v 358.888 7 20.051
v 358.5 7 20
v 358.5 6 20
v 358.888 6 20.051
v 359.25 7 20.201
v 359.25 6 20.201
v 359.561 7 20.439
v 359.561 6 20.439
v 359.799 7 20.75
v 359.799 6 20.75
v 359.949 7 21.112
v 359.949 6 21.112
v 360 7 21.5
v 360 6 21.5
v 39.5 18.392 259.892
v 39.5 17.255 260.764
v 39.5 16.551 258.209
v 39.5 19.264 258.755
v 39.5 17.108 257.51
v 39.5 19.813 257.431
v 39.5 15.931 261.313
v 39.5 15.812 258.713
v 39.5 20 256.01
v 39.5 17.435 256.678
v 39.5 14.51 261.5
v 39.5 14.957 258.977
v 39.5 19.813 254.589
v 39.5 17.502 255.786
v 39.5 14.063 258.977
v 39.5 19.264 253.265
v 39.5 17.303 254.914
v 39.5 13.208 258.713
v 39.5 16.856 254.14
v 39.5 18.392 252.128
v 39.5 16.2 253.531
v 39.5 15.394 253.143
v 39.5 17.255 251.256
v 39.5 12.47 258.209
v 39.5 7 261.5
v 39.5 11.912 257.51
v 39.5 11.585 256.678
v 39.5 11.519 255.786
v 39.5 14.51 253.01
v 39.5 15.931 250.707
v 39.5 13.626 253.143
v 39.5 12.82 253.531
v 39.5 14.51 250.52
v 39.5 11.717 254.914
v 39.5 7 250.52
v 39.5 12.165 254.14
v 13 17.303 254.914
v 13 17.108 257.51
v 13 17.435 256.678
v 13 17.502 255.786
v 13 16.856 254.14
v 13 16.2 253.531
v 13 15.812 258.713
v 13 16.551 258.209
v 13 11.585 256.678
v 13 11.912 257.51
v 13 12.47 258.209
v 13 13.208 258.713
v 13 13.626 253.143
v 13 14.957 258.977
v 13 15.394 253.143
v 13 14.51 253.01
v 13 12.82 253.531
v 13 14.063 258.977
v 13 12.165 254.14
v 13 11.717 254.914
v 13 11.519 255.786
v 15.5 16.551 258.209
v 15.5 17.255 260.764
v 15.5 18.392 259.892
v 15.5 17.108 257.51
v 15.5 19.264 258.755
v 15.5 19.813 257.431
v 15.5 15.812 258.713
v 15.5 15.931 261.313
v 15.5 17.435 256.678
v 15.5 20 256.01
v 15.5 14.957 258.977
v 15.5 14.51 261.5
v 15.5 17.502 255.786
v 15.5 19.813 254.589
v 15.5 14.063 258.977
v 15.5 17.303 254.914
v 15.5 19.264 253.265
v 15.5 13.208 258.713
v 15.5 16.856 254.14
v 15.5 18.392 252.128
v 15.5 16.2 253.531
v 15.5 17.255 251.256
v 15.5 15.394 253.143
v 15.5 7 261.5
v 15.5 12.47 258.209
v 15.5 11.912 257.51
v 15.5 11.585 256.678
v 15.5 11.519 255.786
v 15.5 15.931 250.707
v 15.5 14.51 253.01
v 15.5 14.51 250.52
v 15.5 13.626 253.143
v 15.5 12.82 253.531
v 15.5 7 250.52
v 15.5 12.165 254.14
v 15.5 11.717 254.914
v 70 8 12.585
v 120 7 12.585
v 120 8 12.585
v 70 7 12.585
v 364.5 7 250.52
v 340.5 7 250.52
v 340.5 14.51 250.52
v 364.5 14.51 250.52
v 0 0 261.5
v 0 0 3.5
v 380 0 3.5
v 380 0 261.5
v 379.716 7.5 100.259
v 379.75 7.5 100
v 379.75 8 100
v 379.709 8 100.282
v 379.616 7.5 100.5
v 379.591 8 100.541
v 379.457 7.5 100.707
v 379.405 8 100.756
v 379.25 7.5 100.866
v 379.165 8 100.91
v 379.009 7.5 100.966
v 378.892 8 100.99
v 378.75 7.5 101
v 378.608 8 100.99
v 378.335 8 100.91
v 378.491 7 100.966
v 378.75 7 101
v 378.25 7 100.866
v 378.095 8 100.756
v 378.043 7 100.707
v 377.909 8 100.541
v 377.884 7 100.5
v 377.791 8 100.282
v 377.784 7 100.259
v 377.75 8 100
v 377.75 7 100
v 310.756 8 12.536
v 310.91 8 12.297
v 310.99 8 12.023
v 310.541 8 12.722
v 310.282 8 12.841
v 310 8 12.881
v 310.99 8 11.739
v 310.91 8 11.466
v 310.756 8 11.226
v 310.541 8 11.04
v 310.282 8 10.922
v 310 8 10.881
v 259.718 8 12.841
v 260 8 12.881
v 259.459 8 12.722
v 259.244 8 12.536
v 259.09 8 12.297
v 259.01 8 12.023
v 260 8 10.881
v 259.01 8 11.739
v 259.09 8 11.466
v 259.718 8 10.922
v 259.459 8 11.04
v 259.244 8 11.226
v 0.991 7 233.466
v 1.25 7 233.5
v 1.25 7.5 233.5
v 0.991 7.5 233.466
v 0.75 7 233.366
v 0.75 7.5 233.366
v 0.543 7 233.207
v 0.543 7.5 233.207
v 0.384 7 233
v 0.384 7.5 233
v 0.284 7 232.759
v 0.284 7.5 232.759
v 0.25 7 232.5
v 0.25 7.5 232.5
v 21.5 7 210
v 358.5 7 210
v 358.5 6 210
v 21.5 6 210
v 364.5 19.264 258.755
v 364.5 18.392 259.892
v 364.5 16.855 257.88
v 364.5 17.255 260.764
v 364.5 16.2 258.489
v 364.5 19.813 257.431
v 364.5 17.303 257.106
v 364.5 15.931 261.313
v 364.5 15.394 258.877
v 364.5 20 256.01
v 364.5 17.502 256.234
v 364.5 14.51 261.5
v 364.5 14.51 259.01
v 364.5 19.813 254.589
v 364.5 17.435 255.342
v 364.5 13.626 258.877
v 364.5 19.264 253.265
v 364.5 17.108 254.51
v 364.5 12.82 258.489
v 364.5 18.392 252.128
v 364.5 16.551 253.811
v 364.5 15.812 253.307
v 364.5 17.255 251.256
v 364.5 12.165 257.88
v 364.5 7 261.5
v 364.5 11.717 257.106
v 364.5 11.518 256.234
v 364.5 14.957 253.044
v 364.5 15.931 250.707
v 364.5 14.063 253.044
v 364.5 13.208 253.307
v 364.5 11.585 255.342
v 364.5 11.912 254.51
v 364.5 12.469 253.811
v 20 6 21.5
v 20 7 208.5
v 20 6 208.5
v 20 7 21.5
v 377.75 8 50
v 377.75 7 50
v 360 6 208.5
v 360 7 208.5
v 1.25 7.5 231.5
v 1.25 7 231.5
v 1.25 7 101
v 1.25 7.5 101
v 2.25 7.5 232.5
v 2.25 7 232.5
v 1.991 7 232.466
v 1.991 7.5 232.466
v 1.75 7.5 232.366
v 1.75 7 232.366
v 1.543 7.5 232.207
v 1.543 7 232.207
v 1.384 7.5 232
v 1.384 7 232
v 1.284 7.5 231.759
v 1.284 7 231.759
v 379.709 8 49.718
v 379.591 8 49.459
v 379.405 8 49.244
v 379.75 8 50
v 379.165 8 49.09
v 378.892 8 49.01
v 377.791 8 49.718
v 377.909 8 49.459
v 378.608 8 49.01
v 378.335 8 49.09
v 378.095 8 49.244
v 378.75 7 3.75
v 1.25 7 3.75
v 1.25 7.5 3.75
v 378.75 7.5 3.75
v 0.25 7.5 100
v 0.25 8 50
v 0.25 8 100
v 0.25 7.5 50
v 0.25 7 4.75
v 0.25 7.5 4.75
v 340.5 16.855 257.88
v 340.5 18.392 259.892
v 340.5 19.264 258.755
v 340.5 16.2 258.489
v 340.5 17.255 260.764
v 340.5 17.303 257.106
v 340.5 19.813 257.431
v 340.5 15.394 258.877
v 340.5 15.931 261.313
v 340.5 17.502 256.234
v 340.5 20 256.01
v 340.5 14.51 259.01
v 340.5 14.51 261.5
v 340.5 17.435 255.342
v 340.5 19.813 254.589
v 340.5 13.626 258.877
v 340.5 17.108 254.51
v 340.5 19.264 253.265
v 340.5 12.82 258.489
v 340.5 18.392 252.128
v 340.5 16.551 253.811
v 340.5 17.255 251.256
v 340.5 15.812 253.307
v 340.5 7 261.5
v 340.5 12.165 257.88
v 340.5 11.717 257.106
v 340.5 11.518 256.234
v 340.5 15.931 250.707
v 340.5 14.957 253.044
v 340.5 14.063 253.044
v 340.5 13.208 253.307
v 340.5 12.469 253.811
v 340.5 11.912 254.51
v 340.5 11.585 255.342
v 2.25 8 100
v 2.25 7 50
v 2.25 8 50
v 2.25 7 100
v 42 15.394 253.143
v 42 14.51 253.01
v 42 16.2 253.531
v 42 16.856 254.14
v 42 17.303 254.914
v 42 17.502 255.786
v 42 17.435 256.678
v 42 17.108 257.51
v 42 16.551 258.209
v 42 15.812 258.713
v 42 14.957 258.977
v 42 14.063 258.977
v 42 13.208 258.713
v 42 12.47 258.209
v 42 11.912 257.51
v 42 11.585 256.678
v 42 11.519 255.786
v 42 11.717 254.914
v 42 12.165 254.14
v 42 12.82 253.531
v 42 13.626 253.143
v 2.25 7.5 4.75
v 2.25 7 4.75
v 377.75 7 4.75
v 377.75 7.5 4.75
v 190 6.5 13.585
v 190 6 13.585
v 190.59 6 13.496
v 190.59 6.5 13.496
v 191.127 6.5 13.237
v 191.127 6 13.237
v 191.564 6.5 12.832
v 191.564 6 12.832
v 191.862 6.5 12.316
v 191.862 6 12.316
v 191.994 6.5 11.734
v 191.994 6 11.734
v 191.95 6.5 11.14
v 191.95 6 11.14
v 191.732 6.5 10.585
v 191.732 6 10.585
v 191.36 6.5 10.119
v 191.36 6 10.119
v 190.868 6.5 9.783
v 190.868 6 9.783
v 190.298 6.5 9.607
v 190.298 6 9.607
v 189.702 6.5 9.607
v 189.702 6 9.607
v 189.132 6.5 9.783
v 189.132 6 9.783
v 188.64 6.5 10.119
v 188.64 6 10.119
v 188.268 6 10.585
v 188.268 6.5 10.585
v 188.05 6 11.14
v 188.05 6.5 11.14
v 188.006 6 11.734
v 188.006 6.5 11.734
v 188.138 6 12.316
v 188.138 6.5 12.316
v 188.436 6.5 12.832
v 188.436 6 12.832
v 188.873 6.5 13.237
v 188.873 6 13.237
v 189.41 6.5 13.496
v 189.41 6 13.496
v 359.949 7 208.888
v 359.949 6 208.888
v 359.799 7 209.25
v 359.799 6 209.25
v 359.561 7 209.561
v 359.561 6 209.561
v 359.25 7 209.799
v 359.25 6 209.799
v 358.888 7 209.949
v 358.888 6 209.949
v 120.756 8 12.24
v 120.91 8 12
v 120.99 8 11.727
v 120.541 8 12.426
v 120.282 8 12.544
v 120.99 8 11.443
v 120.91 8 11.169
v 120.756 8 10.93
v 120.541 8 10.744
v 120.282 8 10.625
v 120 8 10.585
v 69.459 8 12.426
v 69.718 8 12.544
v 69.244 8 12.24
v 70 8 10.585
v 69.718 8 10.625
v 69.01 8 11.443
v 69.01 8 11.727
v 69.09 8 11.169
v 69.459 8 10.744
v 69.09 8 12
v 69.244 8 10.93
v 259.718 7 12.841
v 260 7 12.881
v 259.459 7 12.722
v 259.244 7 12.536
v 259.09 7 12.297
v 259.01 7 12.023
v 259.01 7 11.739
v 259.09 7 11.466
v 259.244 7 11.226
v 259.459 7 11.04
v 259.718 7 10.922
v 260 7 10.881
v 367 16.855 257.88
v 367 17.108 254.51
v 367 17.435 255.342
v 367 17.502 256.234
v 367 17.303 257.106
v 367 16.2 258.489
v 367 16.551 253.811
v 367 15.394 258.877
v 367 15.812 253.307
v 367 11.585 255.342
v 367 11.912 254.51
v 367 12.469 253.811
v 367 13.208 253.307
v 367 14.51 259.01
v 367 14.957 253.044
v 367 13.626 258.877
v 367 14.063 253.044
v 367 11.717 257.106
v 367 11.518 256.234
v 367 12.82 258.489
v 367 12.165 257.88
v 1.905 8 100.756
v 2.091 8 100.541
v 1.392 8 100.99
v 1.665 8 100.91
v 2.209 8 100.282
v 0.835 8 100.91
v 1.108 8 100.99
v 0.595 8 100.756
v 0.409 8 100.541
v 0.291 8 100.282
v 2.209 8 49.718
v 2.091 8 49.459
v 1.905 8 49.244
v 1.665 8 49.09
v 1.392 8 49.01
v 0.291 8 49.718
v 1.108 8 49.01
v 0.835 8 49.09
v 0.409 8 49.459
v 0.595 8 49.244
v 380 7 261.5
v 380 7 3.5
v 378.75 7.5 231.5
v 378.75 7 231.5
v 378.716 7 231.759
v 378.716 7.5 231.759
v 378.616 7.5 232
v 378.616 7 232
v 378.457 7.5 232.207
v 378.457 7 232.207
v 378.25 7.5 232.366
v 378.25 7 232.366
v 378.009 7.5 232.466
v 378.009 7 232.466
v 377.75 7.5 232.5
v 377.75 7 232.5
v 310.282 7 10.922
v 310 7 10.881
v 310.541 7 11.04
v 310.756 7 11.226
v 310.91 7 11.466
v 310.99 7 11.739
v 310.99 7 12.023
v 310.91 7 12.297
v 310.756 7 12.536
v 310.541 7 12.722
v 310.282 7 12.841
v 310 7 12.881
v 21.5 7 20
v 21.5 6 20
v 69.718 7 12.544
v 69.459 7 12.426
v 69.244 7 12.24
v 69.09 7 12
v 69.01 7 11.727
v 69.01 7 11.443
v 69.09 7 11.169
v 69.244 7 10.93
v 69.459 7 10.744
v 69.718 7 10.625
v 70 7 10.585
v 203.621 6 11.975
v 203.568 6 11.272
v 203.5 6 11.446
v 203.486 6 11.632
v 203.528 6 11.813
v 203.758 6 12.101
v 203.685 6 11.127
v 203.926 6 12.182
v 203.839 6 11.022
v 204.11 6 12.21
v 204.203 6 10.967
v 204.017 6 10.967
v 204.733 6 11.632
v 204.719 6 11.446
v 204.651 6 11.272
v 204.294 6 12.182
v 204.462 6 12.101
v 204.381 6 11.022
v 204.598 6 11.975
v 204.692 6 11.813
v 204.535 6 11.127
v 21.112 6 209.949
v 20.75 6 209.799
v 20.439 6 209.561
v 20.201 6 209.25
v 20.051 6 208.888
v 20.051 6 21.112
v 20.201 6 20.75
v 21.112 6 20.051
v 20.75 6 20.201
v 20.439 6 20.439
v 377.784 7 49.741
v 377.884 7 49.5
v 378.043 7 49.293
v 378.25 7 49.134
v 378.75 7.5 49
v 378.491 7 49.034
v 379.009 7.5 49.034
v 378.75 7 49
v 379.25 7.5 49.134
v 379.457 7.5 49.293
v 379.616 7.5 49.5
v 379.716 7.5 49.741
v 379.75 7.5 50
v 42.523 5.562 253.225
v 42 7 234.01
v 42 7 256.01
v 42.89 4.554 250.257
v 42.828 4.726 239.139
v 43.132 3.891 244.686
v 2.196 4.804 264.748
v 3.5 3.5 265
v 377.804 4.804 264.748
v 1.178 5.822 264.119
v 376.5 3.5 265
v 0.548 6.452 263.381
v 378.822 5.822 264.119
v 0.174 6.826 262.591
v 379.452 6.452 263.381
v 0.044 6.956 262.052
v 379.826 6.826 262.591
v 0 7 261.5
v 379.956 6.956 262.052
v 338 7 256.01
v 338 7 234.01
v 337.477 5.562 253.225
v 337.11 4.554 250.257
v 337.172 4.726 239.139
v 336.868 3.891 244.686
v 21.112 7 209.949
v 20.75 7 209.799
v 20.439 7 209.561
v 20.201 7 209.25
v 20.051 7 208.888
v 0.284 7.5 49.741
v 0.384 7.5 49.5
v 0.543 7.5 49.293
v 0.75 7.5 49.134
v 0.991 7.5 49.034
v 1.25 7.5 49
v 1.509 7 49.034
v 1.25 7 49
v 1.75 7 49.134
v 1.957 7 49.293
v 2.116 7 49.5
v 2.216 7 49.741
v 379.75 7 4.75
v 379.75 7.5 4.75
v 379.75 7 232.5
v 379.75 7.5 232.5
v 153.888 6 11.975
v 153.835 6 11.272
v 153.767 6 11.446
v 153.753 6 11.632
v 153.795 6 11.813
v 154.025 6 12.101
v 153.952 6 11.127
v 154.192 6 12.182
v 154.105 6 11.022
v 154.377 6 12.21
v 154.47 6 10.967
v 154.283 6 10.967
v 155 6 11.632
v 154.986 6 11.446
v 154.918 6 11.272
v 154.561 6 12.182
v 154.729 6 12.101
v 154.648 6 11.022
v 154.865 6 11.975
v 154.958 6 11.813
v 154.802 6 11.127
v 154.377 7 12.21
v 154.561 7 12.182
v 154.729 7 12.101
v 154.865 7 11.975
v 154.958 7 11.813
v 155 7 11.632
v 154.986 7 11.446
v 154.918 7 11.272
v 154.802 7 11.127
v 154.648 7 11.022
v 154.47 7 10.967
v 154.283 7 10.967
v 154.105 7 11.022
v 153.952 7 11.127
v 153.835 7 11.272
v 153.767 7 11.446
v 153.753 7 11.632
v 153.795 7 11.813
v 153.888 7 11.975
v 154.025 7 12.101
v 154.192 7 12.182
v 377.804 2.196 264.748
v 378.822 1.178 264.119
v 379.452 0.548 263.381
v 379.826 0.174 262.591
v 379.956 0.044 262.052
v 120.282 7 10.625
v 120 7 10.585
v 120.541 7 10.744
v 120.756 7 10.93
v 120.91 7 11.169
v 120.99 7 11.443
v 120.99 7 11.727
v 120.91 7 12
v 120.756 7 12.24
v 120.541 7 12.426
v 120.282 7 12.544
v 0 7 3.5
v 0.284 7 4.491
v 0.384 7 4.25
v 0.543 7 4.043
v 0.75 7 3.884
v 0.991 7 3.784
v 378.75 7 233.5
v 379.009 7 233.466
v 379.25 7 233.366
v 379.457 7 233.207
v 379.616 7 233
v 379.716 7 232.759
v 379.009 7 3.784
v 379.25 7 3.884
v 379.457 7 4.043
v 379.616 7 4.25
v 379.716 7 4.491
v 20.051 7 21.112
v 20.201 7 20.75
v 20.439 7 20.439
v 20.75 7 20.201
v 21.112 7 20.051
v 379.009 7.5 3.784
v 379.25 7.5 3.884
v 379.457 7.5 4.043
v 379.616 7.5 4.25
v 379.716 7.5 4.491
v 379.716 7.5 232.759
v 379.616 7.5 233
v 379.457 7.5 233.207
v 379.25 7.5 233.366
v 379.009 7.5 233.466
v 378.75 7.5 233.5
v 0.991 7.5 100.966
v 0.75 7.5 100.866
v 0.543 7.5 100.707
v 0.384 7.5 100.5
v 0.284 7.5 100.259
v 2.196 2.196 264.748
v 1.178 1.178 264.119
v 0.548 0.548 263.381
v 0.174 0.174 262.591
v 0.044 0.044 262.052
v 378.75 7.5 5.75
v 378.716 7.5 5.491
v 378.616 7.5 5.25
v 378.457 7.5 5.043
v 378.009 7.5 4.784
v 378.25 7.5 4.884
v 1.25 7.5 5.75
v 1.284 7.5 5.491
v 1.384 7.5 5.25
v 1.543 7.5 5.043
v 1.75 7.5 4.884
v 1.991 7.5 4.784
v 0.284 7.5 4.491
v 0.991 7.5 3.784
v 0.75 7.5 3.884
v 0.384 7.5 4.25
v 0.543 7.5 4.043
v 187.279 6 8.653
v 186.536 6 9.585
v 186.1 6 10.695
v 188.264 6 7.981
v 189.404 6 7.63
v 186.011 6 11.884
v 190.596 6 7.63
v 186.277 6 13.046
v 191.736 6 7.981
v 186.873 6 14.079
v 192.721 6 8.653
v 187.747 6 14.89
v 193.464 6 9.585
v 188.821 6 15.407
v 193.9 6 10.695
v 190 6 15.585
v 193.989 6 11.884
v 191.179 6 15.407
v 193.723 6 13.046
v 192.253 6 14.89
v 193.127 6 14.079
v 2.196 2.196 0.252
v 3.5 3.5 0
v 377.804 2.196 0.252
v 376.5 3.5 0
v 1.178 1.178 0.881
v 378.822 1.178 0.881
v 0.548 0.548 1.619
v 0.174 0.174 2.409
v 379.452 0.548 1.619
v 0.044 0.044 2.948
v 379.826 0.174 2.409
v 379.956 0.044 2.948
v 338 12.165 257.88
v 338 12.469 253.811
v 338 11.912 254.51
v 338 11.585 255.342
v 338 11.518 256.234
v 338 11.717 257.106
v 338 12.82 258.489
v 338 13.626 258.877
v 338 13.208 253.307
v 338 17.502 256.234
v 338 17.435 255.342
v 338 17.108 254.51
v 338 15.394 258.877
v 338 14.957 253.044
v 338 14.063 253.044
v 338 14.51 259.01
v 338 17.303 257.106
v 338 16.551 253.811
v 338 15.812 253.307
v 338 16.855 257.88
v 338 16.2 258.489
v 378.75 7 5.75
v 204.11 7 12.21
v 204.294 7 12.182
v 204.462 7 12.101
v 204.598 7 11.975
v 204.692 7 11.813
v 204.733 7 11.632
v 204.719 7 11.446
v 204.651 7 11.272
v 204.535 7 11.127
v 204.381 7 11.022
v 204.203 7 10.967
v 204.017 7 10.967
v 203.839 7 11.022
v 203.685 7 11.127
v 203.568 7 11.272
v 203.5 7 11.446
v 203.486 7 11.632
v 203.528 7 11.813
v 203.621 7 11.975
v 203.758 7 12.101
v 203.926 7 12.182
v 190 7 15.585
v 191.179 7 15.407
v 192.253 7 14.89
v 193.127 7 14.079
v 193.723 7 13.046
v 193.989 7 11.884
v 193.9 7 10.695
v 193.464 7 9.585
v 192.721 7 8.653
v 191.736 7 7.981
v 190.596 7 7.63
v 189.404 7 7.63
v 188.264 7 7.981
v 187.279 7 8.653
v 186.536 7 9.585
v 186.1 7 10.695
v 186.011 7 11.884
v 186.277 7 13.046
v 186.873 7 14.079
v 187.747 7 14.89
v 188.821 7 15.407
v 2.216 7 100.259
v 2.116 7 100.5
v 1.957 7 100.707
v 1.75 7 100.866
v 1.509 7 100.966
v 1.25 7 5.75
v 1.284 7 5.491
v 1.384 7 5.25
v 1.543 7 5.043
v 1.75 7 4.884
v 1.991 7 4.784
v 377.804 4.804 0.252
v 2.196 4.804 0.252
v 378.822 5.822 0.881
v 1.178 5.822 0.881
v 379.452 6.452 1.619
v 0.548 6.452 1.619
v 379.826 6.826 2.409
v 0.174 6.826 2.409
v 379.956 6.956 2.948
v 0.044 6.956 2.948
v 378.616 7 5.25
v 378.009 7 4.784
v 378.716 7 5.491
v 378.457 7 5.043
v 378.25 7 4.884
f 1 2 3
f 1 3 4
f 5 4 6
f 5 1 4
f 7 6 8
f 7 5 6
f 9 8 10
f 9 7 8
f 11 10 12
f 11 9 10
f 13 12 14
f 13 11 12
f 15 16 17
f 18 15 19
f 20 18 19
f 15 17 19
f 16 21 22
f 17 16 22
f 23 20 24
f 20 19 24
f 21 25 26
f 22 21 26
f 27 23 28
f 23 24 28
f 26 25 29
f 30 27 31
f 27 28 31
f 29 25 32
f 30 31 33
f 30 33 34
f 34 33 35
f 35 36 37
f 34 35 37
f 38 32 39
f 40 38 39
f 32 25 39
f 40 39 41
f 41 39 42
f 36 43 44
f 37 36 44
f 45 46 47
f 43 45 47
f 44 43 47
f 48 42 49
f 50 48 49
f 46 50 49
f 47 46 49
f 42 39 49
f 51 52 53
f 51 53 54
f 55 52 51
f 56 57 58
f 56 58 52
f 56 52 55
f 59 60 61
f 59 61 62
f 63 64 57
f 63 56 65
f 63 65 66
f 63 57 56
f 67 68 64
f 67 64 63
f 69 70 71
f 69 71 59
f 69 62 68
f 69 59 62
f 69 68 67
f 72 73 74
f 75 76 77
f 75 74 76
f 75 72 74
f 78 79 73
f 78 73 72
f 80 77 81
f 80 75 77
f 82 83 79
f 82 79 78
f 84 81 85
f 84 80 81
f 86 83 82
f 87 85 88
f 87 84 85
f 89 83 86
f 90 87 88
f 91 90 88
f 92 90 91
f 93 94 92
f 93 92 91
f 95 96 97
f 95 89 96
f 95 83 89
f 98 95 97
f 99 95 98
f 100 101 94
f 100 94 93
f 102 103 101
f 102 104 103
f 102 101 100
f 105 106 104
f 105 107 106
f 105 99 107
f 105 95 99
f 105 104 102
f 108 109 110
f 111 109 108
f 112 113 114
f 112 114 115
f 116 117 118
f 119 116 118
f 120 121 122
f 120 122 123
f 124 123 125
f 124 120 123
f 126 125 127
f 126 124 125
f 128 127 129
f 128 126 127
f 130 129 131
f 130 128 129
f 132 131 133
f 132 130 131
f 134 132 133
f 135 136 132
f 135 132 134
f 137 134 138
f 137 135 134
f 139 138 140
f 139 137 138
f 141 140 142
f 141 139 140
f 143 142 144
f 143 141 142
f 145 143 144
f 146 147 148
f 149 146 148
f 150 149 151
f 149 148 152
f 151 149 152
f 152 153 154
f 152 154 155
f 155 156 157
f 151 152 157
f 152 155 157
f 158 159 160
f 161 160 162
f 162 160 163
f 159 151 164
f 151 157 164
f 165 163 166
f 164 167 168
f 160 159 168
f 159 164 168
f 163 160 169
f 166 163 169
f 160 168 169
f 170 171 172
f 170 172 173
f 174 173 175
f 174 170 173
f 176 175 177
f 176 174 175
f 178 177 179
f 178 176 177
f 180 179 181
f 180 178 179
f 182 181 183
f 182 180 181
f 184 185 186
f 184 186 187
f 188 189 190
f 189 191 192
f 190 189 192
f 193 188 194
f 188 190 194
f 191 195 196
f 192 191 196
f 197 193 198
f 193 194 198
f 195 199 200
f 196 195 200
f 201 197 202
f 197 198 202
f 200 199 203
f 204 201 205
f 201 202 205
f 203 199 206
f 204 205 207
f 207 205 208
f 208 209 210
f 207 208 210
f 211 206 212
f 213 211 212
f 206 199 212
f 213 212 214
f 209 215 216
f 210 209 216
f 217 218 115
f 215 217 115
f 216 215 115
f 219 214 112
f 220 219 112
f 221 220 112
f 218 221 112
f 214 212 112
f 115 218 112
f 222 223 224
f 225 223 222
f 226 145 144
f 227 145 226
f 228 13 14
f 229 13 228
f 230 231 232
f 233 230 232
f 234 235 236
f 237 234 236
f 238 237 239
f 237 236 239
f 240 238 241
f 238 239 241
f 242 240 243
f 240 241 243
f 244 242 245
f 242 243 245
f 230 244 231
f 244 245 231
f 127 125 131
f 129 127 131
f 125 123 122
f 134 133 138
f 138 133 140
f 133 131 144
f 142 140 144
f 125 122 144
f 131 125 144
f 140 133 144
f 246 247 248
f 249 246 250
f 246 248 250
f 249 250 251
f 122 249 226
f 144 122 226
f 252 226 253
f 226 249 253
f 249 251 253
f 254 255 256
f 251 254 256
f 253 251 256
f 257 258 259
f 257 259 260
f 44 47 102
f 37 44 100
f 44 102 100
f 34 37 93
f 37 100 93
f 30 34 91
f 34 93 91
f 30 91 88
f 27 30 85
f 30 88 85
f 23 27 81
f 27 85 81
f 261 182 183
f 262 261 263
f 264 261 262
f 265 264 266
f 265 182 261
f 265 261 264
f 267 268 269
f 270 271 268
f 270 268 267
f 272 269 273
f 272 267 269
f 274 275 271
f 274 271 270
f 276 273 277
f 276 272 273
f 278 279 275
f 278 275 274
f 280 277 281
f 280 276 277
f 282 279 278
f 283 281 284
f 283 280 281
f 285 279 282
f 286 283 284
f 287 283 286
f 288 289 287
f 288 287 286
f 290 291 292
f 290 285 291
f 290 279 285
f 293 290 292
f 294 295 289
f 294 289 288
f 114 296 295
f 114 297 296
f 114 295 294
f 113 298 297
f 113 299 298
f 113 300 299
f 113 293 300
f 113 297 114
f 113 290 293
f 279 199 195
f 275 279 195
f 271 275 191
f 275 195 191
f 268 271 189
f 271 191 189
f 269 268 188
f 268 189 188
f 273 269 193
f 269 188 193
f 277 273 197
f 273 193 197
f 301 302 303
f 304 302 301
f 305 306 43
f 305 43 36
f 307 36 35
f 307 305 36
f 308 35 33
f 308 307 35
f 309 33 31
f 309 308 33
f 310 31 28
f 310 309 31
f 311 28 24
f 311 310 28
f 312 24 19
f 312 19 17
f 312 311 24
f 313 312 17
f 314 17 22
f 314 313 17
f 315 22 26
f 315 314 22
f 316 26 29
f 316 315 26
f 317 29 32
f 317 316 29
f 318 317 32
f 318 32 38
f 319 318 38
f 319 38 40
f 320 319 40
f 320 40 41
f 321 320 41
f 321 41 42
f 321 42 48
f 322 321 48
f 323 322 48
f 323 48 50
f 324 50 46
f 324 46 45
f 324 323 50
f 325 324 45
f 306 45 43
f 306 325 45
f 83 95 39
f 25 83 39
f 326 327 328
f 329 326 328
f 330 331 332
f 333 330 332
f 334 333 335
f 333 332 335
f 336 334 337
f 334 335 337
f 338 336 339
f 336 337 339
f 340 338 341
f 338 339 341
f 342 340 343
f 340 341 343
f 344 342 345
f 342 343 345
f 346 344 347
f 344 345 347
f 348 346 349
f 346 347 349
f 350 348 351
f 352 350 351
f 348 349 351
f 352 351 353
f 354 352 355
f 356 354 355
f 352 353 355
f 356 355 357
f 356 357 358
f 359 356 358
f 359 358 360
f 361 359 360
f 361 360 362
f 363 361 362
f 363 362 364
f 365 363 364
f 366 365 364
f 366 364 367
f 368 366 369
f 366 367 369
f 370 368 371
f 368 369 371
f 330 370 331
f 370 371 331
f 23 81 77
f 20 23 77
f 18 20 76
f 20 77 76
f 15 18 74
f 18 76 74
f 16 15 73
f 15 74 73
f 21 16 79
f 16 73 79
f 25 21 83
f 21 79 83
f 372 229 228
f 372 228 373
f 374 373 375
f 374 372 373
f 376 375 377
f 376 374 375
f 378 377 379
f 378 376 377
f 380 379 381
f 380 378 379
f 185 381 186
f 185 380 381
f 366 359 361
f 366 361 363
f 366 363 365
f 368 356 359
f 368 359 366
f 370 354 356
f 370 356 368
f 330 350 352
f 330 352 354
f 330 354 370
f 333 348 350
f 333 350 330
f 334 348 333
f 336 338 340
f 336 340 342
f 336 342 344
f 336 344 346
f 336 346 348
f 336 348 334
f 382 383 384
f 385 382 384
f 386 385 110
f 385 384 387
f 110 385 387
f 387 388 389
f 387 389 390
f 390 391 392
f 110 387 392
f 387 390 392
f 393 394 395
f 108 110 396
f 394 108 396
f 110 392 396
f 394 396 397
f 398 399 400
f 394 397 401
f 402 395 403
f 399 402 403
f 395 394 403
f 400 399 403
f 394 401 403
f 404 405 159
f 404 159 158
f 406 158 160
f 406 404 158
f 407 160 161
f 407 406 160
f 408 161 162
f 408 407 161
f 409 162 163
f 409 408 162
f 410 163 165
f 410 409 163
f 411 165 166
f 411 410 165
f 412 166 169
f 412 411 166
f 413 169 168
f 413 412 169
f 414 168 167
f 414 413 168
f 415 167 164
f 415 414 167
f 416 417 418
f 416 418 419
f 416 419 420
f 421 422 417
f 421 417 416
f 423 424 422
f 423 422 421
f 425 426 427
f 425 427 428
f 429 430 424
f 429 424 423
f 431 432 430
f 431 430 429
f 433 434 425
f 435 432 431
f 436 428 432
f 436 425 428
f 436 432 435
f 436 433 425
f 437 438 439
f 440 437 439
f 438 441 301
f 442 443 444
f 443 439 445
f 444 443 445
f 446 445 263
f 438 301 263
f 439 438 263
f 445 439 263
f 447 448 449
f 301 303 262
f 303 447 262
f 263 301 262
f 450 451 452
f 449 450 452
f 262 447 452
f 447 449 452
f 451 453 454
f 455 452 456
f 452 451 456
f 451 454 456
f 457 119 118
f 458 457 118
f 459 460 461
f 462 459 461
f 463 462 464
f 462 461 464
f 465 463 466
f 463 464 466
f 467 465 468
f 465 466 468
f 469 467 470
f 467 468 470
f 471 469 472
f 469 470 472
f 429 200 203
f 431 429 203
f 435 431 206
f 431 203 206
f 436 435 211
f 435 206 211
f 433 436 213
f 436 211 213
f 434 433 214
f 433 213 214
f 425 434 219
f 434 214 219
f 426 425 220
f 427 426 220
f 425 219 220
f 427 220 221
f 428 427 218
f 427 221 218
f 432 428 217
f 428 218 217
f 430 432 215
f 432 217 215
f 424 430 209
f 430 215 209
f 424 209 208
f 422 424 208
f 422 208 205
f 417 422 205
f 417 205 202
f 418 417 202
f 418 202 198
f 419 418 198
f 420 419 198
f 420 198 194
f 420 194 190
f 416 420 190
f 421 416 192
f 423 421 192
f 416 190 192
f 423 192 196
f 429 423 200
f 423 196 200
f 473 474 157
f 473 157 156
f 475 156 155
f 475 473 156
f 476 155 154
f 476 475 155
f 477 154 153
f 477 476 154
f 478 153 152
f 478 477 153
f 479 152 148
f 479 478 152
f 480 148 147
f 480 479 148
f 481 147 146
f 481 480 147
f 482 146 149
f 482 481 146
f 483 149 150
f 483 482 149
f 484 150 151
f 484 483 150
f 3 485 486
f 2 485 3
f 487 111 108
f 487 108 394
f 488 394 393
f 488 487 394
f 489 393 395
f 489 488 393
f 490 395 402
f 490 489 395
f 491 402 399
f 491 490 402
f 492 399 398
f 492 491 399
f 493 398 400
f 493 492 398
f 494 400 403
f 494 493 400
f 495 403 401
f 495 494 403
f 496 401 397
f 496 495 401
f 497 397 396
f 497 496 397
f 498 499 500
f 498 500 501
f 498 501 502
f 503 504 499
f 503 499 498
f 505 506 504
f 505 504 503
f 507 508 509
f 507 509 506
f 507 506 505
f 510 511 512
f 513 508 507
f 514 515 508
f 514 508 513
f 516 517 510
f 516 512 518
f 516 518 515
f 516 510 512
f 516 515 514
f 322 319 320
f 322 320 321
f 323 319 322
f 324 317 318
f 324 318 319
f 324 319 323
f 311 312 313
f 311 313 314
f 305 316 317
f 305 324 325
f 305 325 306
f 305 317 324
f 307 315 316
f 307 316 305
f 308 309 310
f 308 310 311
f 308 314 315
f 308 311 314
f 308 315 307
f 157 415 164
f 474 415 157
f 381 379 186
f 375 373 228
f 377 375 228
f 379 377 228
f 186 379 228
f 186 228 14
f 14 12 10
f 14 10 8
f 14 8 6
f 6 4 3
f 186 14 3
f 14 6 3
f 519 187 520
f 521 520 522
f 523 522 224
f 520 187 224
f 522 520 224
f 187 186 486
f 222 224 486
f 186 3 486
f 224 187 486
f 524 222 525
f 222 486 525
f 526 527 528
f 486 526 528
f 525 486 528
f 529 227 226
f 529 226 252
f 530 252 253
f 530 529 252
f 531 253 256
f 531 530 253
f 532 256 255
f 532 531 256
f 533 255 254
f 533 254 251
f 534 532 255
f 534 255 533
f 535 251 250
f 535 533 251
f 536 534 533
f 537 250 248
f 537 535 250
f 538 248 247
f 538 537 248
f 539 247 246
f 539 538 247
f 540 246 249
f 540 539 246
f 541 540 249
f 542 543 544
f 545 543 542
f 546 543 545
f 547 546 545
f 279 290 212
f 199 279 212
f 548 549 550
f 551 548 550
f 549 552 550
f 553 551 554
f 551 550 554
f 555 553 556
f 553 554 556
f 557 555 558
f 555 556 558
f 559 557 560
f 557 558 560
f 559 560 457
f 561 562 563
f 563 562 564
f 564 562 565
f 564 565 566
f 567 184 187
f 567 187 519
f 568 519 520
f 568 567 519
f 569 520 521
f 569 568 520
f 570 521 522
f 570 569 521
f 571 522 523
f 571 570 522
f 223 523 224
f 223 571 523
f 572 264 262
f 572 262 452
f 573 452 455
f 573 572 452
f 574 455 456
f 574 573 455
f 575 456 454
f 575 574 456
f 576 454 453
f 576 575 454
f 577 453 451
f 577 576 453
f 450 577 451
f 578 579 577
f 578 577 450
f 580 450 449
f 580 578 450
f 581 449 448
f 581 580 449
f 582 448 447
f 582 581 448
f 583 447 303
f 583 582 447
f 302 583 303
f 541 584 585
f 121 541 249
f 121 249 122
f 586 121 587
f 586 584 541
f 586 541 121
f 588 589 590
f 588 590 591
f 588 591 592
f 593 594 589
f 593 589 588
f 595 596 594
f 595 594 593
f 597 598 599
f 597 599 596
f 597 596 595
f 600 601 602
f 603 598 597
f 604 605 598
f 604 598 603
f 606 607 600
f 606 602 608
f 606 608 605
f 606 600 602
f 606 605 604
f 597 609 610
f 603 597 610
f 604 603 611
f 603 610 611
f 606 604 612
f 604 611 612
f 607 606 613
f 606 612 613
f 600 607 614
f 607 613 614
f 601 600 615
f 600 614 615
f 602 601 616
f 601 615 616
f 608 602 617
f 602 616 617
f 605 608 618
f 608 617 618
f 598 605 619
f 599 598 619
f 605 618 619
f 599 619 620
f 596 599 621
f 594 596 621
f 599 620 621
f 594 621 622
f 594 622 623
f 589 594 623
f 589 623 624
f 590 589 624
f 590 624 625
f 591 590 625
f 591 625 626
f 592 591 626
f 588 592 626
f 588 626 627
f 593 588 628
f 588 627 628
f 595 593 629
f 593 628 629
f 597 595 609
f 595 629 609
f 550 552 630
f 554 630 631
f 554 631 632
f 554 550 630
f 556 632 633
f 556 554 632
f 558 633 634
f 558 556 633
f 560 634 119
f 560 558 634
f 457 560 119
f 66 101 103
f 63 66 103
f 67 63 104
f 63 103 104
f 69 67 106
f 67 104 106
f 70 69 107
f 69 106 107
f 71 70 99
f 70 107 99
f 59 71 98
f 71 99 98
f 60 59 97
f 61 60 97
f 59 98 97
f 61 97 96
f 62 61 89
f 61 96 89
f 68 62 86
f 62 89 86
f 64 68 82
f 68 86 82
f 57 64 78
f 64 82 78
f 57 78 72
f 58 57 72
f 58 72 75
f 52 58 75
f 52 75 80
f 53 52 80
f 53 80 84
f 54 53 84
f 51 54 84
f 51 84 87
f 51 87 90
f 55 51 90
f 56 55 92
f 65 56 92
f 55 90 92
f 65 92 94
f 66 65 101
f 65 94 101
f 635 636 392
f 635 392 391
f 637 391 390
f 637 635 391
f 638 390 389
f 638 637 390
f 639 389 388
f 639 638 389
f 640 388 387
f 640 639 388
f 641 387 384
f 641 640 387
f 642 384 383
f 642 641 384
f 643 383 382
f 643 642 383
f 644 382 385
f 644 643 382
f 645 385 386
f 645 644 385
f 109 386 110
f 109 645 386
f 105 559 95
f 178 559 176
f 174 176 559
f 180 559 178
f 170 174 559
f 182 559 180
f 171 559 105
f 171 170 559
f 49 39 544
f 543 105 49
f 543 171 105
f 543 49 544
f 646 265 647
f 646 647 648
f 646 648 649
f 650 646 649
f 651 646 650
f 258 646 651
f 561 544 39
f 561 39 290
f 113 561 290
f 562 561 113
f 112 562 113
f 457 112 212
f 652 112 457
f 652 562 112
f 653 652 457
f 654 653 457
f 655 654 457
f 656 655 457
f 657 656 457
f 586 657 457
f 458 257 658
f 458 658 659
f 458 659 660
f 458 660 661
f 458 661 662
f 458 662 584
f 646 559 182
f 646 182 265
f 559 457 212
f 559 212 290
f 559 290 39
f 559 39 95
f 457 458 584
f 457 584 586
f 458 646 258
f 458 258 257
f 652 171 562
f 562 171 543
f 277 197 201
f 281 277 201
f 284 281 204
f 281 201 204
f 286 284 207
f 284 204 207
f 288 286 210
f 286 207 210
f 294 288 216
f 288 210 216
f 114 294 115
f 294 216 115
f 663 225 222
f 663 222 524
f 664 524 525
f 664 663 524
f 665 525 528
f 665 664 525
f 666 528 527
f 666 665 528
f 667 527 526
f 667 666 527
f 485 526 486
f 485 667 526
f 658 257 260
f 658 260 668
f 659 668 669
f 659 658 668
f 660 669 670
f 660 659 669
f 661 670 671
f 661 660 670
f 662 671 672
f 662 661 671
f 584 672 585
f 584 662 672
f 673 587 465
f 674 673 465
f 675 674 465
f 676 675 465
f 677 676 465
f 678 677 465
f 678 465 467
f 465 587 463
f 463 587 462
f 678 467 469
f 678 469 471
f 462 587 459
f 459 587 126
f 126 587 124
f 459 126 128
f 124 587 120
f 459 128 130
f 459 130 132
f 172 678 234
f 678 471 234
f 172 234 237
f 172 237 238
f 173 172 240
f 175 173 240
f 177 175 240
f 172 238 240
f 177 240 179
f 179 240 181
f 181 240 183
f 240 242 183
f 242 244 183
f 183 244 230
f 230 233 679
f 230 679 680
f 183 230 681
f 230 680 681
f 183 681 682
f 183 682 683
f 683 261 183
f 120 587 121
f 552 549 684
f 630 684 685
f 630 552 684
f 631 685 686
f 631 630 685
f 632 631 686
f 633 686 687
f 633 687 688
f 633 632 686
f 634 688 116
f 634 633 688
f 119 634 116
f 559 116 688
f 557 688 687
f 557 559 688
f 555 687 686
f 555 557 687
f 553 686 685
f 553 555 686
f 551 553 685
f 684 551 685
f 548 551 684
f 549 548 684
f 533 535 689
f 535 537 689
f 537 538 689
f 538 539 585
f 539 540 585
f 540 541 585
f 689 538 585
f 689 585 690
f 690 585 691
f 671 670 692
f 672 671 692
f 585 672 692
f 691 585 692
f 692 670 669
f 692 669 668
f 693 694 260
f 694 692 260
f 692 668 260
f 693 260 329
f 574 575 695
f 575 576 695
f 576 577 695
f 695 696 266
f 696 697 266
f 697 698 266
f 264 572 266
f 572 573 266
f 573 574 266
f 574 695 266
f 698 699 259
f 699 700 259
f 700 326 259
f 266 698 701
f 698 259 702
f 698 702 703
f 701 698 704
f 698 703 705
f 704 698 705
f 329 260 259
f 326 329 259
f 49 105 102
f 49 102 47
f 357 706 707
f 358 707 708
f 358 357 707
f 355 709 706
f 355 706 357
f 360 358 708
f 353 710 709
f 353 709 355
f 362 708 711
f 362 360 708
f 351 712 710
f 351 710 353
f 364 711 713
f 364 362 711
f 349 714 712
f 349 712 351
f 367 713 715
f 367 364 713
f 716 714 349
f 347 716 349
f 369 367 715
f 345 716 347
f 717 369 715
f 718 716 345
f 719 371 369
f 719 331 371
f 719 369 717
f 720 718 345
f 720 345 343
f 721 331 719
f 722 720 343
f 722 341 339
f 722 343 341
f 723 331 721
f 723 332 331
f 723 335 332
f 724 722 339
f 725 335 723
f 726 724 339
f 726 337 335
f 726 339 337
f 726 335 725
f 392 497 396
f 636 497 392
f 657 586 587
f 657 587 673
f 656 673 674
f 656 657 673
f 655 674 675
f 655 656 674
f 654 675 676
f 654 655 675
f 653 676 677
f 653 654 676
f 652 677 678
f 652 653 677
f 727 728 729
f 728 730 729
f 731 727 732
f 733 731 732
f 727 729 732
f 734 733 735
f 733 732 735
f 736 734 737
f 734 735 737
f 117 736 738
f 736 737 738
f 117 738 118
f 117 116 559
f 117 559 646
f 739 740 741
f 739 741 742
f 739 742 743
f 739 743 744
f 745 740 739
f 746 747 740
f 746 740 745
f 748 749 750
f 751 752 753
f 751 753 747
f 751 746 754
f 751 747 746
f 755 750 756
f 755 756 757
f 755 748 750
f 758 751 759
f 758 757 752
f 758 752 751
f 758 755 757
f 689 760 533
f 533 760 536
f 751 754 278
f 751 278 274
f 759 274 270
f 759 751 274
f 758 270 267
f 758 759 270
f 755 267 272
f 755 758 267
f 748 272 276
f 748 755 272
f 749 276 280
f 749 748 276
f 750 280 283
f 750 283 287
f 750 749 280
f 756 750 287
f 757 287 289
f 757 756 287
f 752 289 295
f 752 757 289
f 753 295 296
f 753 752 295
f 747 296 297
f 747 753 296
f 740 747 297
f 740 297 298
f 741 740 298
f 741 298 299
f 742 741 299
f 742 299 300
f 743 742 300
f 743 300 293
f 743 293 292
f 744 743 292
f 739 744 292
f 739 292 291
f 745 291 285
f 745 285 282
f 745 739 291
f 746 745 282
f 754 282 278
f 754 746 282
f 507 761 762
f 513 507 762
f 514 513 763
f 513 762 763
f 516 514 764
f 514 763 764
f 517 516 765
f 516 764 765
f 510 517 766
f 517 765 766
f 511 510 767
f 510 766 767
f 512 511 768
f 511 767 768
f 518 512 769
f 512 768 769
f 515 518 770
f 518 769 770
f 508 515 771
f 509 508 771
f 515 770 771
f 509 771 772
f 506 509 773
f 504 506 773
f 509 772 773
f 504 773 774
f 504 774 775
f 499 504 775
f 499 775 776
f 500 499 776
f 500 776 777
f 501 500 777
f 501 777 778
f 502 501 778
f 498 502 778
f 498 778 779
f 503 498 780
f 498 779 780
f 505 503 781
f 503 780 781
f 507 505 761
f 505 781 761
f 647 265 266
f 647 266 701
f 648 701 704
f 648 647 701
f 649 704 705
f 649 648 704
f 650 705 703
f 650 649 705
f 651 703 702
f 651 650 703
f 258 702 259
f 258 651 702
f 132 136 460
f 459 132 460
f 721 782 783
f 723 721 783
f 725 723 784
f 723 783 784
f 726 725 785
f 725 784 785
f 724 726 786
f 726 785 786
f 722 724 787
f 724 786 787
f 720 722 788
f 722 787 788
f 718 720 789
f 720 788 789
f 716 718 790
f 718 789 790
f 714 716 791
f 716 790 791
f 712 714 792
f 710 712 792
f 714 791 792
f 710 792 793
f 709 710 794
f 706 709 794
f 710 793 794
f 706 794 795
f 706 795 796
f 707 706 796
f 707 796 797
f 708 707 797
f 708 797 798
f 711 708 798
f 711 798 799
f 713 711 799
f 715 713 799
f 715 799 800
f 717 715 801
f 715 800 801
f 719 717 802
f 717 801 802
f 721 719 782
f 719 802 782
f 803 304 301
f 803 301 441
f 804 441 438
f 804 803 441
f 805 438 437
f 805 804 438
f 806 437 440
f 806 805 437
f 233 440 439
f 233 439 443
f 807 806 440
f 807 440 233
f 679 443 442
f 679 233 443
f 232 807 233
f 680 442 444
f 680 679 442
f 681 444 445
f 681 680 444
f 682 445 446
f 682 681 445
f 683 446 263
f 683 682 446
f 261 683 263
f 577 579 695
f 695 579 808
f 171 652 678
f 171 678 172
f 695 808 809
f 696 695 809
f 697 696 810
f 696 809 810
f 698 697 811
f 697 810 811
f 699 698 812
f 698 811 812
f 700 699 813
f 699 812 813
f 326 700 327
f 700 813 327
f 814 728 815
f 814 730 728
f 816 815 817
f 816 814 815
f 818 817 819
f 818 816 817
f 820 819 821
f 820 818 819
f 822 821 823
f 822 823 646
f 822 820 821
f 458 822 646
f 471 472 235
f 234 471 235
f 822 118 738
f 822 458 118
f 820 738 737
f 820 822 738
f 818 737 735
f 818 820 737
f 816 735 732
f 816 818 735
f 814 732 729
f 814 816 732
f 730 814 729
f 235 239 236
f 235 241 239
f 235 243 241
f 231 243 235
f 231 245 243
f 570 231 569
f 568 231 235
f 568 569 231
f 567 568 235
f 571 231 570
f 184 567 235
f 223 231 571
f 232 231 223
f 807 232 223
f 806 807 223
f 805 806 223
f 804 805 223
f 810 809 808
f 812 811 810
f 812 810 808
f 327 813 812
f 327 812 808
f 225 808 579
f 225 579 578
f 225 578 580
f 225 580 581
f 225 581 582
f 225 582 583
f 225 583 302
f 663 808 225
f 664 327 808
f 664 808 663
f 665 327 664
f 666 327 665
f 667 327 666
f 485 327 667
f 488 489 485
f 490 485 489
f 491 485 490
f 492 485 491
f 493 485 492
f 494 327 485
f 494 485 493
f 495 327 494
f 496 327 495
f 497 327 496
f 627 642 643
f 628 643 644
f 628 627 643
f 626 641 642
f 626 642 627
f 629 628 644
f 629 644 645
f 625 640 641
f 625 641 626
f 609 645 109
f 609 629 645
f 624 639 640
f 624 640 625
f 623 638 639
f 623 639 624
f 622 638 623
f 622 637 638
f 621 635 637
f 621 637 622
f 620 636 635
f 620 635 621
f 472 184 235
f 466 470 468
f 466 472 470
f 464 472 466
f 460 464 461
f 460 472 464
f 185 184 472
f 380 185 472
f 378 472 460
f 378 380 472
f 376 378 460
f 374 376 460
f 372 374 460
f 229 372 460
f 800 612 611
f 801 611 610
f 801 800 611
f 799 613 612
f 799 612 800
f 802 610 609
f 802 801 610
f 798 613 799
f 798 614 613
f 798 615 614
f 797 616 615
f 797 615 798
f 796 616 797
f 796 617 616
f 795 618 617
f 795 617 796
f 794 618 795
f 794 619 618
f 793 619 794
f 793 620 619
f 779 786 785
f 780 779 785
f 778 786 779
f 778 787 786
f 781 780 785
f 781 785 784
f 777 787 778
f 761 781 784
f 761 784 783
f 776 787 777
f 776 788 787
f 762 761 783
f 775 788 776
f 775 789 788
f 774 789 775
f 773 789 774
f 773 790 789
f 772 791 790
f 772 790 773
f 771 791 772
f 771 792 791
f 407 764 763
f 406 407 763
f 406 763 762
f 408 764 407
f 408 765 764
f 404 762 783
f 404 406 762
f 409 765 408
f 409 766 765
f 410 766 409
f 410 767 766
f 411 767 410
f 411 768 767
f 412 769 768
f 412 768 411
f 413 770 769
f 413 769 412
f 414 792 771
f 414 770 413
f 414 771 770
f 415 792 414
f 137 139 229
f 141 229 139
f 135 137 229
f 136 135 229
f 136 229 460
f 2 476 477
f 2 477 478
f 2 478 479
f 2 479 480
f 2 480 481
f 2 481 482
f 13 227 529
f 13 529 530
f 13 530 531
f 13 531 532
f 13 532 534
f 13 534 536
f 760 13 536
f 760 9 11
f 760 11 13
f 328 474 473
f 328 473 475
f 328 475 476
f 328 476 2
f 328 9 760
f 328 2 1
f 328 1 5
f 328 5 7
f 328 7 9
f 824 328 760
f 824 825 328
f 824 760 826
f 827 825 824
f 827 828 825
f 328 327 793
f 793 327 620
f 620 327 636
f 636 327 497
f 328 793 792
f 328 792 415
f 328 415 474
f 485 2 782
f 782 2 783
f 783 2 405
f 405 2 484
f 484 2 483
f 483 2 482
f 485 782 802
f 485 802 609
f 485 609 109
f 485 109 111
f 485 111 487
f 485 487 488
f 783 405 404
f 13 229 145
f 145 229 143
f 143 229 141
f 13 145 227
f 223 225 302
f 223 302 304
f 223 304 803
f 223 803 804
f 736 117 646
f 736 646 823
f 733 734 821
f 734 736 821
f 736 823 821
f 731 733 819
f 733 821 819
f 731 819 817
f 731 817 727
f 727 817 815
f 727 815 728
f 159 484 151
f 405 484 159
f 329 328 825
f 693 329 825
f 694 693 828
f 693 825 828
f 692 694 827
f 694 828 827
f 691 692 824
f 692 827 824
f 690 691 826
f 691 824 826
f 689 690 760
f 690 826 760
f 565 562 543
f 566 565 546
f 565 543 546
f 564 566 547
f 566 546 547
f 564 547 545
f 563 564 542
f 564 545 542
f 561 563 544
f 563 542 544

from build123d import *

# Parameters (mm, degrees)
SKETCH1_W            = 380
SKETCH1_H            = 265
BOSS_EXTRUDE1_DEPTH  = 7
FILLET2_R            = 3.5
BOSS_EXTRUDE2_DEPTH  = 0.5
CUT_EXTRUDE1_DEPTH   = 1
SKETCH4_R            = 4
CUT_EXTRUDE2_DEPTH   = 1
SKETCH5_R            = 0.625
CUT_EXTRUDE3_DEPTH   = 1
SKETCH6_R            = 0.625
CUT_EXTRUDE4_DEPTH   = 1
SKETCH7_W            = 24
SKETCH7_H            = 10.979763194
BOSS_EXTRUDE3_DEPTH  = 13
CUT_EXTRUDE6_DEPTH   = 27
SKETCH9_R            = 3
BOSS_EXTRUDE4_DEPTH  = 2.5
BOSS_EXTRUDE5_START  = 2.5
SKETCH10_R           = 3
BOSS_EXTRUDE5_DEPTH  = 2.5
SKETCH11_W           = 24
SKETCH11_H           = 10.98
BOSS_EXTRUDE6_DEPTH  = 13
CUT_EXTRUDE9_DEPTH   = 296
SKETCH22_R           = 3
BOSS_EXTRUDE7_DEPTH  = 2.5
BOSS_EXTRUDE8_START  = 2.5
SKETCH23_R           = 3
BOSS_EXTRUDE8_DEPTH  = 2.5
CUT_EXTRUDE10_DEPTH  = 296
DRAFT1_ANGLE         = 20
DRAFT2_ANGLE         = 20
BOSS_EXTRUDE9_DEPTH  = 1
SKETCH33_R           = 2
BOSS_EXTRUDE10_DEPTH = 0.5


with BuildPart() as part:
    # Sketch1 → Boss-Extrude1 (new body)
    with BuildSketch(Plane(origin=(0, 0, 0), x_dir=(1, 0, 0), z_dir=(0, 1, 0))):
        with Locations((190, -132.5)):
            Rectangle(SKETCH1_W, SKETCH1_H)
    extrude(amount=BOSS_EXTRUDE1_DEPTH)

    # Fillet2
    fillet2_edges = [part.edges().sort_by_distance(p)[0] for p in [
        (190, 7, 0),
        (190, 0, 0),
        (190, 0, 265),
        (190, 7, 265),
        (0, 3.5, 0),
        (380, 3.5, 0),
        (380, 3.5, 265),
        (0, 3.5, 265),
    ]]
    fillet(fillet2_edges, radius=FILLET2_R - 0.0001)  # a hair under: the kernel refuses the full size

    # Sketch2 → Boss-Extrude2 (add)
    with BuildSketch(Plane(origin=(0, 7, 0), x_dir=(1, 0, 0), z_dir=(0, 1, 0))):
        with BuildLine():
            Line((1.25, -3.75), (378.75, -3.75))
            ThreePointArc((378.75, -3.75), (379.457106781, -4.042893219), (379.75, -4.75))
            Line((379.75, -4.75), (379.75, -232.5))
            ThreePointArc((379.75, -232.5), (379.457106781, -233.207106781), (378.75, -233.5))
            Line((378.75, -233.5), (1.25, -233.5))
            ThreePointArc((1.25, -233.5), (0.542893219, -233.207106781), (0.25, -232.5))
            Line((0.25, -232.5), (0.25, -4.75))
            ThreePointArc((0.25, -4.75), (0.542893219, -4.042893219), (1.25, -3.75))
        make_face()
        with BuildLine():
            Line((2.25, -4.75), (377.75, -4.75))
            ThreePointArc((377.75, -4.75), (378.457106781, -5.042893219), (378.75, -5.75))
            Line((378.75, -5.75), (378.75, -231.5))
            ThreePointArc((378.75, -231.5), (378.457106781, -232.207106781), (377.75, -232.5))
            Line((377.75, -232.5), (2.25, -232.5))
            ThreePointArc((2.25, -232.5), (1.542893219, -232.207106781), (1.25, -231.5))
            Line((1.25, -231.5), (1.25, -5.75))
            ThreePointArc((1.25, -5.75), (1.542893219, -5.042893219), (2.25, -4.75))
        make_face(mode=Mode.SUBTRACT)
    extrude(amount=BOSS_EXTRUDE2_DEPTH)

    # Sketch3 → Cut-Extrude1 (cut)
    with BuildSketch(Plane(origin=(0, 7, 0), x_dir=(1, 0, 0), z_dir=(0, 1, 0))):
        with BuildLine():
            Line((21.5, -20), (358.5, -20))
            ThreePointArc((358.5, -20), (359.560660172, -20.439339828), (360, -21.5))
            Line((360, -21.5), (360, -208.5))
            ThreePointArc((360, -208.5), (359.560660172, -209.560660172), (358.5, -210))
            Line((358.5, -210), (21.5, -210))
            ThreePointArc((21.5, -210), (20.439339828, -209.560660172), (20, -208.5))
            Line((20, -208.5), (20, -21.5))
            ThreePointArc((20, -21.5), (20.439339828, -20.439339828), (21.5, -20))
        make_face()
    extrude(amount=-CUT_EXTRUDE1_DEPTH, mode=Mode.SUBTRACT)

    # Sketch4 → Cut-Extrude2 (cut)
    with BuildSketch(Plane(origin=(0, 7, 0), x_dir=(1, 0, 0), z_dir=(0, 1, 0))):
        with Locations(Location((190, -11.584908102, 0), (0, 0, 270))):
            Circle(SKETCH4_R)
    extrude(amount=-CUT_EXTRUDE2_DEPTH, mode=Mode.SUBTRACT)

    # Sketch5 → Cut-Extrude3 (cut)
    with BuildSketch(Plane(origin=(0, 7, 0), x_dir=(1, 0, 0), z_dir=(0, 1, 0))):
        with Locations(Location((154.376617555, -11.584908102, 0), (0, 0, 270))):
            Circle(SKETCH5_R)
    extrude(amount=-CUT_EXTRUDE3_DEPTH, mode=Mode.SUBTRACT)

    # Sketch6 → Cut-Extrude4 (cut)
    with BuildSketch(Plane(origin=(0, 7, 0), x_dir=(1, 0, 0), z_dir=(0, 1, 0))):
        with Locations(Location((204.109733731, -11.584908102, 0), (0, 0, 270))):
            Circle(SKETCH6_R)
    extrude(amount=-CUT_EXTRUDE4_DEPTH, mode=Mode.SUBTRACT)

    # Sketch7 → Boss-Extrude3 (add)
    with BuildSketch(Plane(origin=(0, 7, 0), x_dir=(1, 0, 0), z_dir=(0, 1, 0))):
        with Locations((27.5, -256.010118403)):
            Rectangle(SKETCH7_W, SKETCH7_H)
    extrude(amount=BOSS_EXTRUDE3_DEPTH)

    # Sketch8 → Cut-Extrude6 (cut)
    with BuildSketch(Plane.ZY.offset(-15.5)):
        with BuildLine():
            Line((250.520236806, 20), (250.520236806, 14.510118403))
            ThreePointArc((250.520236806, 14.510118403), (252.128185898, 18.392050908), (256.010118403, 20))
            Line((256.010118403, 20), (250.520236806, 20))
        make_face()
        with BuildLine():
            Line((261.5, 20), (256.010118403, 20))
            ThreePointArc((256.010118403, 20), (259.892050908, 18.392050908), (261.5, 14.510118403))
            Line((261.5, 14.510118403), (261.5, 20))
        make_face()
    extrude(amount=-CUT_EXTRUDE6_DEPTH, mode=Mode.SUBTRACT)

    # Sketch9 → Boss-Extrude4 (add)
    with BuildSketch(Plane.ZY.offset(-15.5)):
        with Locations(Location((256.010118403, 14.510118403, 0), (0, 0, 180))):
            Circle(SKETCH9_R)
    extrude(amount=BOSS_EXTRUDE4_DEPTH)

    # Sketch10 → Boss-Extrude5 (add)
    with BuildSketch(Plane(origin=(39.5, 0, 0), x_dir=(0, 0, -1), z_dir=(1, 0, 0)).offset(BOSS_EXTRUDE5_START)):
        with Locations((-256.010118403, 14.510118403)):
            Circle(SKETCH10_R)
    extrude(amount=-BOSS_EXTRUDE5_DEPTH)

    # Sketch11 → Boss-Extrude6 (add)
    with BuildSketch(Plane(origin=(0, 7, 0), x_dir=(1, 0, 0), z_dir=(0, 1, 0))):
        with Locations((352.5, -256.01)):
            Rectangle(SKETCH11_W, SKETCH11_H)
    extrude(amount=BOSS_EXTRUDE6_DEPTH)

    # Sketch21 → Cut-Extrude9 (cut)
    with BuildSketch(Plane(origin=(364.5, 0, 0), x_dir=(0, 0, -1), z_dir=(1, 0, 0))):
        with BuildLine():
            Line((-250.52, 20), (-256.01, 20))
            ThreePointArc((-256.01, 20), (-252.127983771, 18.392016229), (-250.52, 14.51))
            Line((-250.52, 14.51), (-250.52, 20))
        make_face()
        with BuildLine():
            Line((-261.5, 20), (-261.5, 14.51))
            ThreePointArc((-261.5, 14.51), (-259.892016229, 18.392016229), (-256.01, 20))
            Line((-256.01, 20), (-261.5, 20))
        make_face()
    extrude(amount=-CUT_EXTRUDE9_DEPTH, mode=Mode.SUBTRACT)

    # Sketch22 → Boss-Extrude7 (add)
    with BuildSketch(Plane(origin=(364.5, 0, 0), x_dir=(0, 0, -1), z_dir=(1, 0, 0))):
        with Locations(Location((-256.01, 14.51, 0), (0, 0, 180))):
            Circle(SKETCH22_R)
    extrude(amount=BOSS_EXTRUDE7_DEPTH)

    # Sketch23 → Boss-Extrude8 (add)
    with BuildSketch(Plane.ZY.offset(-340.5).offset(BOSS_EXTRUDE8_START)):
        with Locations((256.01, 14.51)):
            Circle(SKETCH23_R)
    extrude(amount=-BOSS_EXTRUDE8_DEPTH)

    # Sketch31 → Cut-Extrude10 (cut)
    with BuildSketch(Plane(origin=(42, 0, 0), x_dir=(0, 0, -1), z_dir=(1, 0, 0))):
        with BuildLine():
            Line((-256.010118403, 7), (-234.010118403, 7))
            ThreePointArc((-234.010118403, 7), (-245.010118403, 3.88854382), (-256.010118403, 7))
        make_face()
    extrude(amount=CUT_EXTRUDE10_DEPTH, mode=Mode.SUBTRACT)

    # Draft1
    draft1_faces = [part.faces().sort_by_distance(p)[0] for p in [
        (338, 5.747159877, 245.010118403),
    ]]
    draft(draft1_faces, Plane.ZX.offset(7), DRAFT1_ANGLE)

    # Draft2
    draft2_faces = [part.faces().sort_by_distance(p)[0] for p in [
        (42, 5.747159877, 245.010118403),
    ]]
    draft(draft2_faces, Plane.ZX.offset(7), DRAFT2_ANGLE)

    # Sketch32 → Boss-Extrude9 (add)
    with BuildSketch(Plane(origin=(0, 7, 0), x_dir=(1, 0, 0), z_dir=(0, 1, 0))):
        with BuildLine():
            Line((70, -10.584908102), (120, -10.584908102))
            ThreePointArc((120, -10.584908102), (121, -11.584908102), (120, -12.584908102))
            Line((120, -12.584908102), (70, -12.584908102))
            ThreePointArc((70, -12.584908102), (69, -11.584908102), (70, -10.584908102))
        make_face()
        with BuildLine():
            Line((260, -10.881099807), (310, -10.881099807))
            ThreePointArc((310, -10.881099807), (311, -11.881099807), (310, -12.881099807))
            Line((310, -12.881099807), (260, -12.881099807))
            ThreePointArc((260, -12.881099807), (259, -11.881099807), (260, -10.881099807))
        make_face()
        with BuildLine():
            Line((2.25, -50), (2.25, -100))
            ThreePointArc((2.25, -100), (1.25, -101), (0.25, -100))
            Line((0.25, -100), (0.25, -50))
            ThreePointArc((0.25, -50), (1.25, -49), (2.25, -50))
        make_face()
        with BuildLine():
            Line((379.75, -50), (379.75, -100))
            ThreePointArc((379.75, -100), (378.75, -101), (377.75, -100))
            Line((377.75, -100), (377.75, -50))
            ThreePointArc((377.75, -50), (378.75, -49), (379.75, -50))
        make_face()
    extrude(amount=BOSS_EXTRUDE9_DEPTH)

    # Sketch33 → Boss-Extrude10 (add)
    with BuildSketch(Plane(origin=(0, 6, 0), x_dir=(1, 0, 0), z_dir=(0, 1, 0))):
        with Locations(Location((190, -11.584908102, 0), (0, 0, 270))):
            Circle(SKETCH33_R)
    extrude(amount=BOSS_EXTRUDE10_DEPTH)


solid = part.part
